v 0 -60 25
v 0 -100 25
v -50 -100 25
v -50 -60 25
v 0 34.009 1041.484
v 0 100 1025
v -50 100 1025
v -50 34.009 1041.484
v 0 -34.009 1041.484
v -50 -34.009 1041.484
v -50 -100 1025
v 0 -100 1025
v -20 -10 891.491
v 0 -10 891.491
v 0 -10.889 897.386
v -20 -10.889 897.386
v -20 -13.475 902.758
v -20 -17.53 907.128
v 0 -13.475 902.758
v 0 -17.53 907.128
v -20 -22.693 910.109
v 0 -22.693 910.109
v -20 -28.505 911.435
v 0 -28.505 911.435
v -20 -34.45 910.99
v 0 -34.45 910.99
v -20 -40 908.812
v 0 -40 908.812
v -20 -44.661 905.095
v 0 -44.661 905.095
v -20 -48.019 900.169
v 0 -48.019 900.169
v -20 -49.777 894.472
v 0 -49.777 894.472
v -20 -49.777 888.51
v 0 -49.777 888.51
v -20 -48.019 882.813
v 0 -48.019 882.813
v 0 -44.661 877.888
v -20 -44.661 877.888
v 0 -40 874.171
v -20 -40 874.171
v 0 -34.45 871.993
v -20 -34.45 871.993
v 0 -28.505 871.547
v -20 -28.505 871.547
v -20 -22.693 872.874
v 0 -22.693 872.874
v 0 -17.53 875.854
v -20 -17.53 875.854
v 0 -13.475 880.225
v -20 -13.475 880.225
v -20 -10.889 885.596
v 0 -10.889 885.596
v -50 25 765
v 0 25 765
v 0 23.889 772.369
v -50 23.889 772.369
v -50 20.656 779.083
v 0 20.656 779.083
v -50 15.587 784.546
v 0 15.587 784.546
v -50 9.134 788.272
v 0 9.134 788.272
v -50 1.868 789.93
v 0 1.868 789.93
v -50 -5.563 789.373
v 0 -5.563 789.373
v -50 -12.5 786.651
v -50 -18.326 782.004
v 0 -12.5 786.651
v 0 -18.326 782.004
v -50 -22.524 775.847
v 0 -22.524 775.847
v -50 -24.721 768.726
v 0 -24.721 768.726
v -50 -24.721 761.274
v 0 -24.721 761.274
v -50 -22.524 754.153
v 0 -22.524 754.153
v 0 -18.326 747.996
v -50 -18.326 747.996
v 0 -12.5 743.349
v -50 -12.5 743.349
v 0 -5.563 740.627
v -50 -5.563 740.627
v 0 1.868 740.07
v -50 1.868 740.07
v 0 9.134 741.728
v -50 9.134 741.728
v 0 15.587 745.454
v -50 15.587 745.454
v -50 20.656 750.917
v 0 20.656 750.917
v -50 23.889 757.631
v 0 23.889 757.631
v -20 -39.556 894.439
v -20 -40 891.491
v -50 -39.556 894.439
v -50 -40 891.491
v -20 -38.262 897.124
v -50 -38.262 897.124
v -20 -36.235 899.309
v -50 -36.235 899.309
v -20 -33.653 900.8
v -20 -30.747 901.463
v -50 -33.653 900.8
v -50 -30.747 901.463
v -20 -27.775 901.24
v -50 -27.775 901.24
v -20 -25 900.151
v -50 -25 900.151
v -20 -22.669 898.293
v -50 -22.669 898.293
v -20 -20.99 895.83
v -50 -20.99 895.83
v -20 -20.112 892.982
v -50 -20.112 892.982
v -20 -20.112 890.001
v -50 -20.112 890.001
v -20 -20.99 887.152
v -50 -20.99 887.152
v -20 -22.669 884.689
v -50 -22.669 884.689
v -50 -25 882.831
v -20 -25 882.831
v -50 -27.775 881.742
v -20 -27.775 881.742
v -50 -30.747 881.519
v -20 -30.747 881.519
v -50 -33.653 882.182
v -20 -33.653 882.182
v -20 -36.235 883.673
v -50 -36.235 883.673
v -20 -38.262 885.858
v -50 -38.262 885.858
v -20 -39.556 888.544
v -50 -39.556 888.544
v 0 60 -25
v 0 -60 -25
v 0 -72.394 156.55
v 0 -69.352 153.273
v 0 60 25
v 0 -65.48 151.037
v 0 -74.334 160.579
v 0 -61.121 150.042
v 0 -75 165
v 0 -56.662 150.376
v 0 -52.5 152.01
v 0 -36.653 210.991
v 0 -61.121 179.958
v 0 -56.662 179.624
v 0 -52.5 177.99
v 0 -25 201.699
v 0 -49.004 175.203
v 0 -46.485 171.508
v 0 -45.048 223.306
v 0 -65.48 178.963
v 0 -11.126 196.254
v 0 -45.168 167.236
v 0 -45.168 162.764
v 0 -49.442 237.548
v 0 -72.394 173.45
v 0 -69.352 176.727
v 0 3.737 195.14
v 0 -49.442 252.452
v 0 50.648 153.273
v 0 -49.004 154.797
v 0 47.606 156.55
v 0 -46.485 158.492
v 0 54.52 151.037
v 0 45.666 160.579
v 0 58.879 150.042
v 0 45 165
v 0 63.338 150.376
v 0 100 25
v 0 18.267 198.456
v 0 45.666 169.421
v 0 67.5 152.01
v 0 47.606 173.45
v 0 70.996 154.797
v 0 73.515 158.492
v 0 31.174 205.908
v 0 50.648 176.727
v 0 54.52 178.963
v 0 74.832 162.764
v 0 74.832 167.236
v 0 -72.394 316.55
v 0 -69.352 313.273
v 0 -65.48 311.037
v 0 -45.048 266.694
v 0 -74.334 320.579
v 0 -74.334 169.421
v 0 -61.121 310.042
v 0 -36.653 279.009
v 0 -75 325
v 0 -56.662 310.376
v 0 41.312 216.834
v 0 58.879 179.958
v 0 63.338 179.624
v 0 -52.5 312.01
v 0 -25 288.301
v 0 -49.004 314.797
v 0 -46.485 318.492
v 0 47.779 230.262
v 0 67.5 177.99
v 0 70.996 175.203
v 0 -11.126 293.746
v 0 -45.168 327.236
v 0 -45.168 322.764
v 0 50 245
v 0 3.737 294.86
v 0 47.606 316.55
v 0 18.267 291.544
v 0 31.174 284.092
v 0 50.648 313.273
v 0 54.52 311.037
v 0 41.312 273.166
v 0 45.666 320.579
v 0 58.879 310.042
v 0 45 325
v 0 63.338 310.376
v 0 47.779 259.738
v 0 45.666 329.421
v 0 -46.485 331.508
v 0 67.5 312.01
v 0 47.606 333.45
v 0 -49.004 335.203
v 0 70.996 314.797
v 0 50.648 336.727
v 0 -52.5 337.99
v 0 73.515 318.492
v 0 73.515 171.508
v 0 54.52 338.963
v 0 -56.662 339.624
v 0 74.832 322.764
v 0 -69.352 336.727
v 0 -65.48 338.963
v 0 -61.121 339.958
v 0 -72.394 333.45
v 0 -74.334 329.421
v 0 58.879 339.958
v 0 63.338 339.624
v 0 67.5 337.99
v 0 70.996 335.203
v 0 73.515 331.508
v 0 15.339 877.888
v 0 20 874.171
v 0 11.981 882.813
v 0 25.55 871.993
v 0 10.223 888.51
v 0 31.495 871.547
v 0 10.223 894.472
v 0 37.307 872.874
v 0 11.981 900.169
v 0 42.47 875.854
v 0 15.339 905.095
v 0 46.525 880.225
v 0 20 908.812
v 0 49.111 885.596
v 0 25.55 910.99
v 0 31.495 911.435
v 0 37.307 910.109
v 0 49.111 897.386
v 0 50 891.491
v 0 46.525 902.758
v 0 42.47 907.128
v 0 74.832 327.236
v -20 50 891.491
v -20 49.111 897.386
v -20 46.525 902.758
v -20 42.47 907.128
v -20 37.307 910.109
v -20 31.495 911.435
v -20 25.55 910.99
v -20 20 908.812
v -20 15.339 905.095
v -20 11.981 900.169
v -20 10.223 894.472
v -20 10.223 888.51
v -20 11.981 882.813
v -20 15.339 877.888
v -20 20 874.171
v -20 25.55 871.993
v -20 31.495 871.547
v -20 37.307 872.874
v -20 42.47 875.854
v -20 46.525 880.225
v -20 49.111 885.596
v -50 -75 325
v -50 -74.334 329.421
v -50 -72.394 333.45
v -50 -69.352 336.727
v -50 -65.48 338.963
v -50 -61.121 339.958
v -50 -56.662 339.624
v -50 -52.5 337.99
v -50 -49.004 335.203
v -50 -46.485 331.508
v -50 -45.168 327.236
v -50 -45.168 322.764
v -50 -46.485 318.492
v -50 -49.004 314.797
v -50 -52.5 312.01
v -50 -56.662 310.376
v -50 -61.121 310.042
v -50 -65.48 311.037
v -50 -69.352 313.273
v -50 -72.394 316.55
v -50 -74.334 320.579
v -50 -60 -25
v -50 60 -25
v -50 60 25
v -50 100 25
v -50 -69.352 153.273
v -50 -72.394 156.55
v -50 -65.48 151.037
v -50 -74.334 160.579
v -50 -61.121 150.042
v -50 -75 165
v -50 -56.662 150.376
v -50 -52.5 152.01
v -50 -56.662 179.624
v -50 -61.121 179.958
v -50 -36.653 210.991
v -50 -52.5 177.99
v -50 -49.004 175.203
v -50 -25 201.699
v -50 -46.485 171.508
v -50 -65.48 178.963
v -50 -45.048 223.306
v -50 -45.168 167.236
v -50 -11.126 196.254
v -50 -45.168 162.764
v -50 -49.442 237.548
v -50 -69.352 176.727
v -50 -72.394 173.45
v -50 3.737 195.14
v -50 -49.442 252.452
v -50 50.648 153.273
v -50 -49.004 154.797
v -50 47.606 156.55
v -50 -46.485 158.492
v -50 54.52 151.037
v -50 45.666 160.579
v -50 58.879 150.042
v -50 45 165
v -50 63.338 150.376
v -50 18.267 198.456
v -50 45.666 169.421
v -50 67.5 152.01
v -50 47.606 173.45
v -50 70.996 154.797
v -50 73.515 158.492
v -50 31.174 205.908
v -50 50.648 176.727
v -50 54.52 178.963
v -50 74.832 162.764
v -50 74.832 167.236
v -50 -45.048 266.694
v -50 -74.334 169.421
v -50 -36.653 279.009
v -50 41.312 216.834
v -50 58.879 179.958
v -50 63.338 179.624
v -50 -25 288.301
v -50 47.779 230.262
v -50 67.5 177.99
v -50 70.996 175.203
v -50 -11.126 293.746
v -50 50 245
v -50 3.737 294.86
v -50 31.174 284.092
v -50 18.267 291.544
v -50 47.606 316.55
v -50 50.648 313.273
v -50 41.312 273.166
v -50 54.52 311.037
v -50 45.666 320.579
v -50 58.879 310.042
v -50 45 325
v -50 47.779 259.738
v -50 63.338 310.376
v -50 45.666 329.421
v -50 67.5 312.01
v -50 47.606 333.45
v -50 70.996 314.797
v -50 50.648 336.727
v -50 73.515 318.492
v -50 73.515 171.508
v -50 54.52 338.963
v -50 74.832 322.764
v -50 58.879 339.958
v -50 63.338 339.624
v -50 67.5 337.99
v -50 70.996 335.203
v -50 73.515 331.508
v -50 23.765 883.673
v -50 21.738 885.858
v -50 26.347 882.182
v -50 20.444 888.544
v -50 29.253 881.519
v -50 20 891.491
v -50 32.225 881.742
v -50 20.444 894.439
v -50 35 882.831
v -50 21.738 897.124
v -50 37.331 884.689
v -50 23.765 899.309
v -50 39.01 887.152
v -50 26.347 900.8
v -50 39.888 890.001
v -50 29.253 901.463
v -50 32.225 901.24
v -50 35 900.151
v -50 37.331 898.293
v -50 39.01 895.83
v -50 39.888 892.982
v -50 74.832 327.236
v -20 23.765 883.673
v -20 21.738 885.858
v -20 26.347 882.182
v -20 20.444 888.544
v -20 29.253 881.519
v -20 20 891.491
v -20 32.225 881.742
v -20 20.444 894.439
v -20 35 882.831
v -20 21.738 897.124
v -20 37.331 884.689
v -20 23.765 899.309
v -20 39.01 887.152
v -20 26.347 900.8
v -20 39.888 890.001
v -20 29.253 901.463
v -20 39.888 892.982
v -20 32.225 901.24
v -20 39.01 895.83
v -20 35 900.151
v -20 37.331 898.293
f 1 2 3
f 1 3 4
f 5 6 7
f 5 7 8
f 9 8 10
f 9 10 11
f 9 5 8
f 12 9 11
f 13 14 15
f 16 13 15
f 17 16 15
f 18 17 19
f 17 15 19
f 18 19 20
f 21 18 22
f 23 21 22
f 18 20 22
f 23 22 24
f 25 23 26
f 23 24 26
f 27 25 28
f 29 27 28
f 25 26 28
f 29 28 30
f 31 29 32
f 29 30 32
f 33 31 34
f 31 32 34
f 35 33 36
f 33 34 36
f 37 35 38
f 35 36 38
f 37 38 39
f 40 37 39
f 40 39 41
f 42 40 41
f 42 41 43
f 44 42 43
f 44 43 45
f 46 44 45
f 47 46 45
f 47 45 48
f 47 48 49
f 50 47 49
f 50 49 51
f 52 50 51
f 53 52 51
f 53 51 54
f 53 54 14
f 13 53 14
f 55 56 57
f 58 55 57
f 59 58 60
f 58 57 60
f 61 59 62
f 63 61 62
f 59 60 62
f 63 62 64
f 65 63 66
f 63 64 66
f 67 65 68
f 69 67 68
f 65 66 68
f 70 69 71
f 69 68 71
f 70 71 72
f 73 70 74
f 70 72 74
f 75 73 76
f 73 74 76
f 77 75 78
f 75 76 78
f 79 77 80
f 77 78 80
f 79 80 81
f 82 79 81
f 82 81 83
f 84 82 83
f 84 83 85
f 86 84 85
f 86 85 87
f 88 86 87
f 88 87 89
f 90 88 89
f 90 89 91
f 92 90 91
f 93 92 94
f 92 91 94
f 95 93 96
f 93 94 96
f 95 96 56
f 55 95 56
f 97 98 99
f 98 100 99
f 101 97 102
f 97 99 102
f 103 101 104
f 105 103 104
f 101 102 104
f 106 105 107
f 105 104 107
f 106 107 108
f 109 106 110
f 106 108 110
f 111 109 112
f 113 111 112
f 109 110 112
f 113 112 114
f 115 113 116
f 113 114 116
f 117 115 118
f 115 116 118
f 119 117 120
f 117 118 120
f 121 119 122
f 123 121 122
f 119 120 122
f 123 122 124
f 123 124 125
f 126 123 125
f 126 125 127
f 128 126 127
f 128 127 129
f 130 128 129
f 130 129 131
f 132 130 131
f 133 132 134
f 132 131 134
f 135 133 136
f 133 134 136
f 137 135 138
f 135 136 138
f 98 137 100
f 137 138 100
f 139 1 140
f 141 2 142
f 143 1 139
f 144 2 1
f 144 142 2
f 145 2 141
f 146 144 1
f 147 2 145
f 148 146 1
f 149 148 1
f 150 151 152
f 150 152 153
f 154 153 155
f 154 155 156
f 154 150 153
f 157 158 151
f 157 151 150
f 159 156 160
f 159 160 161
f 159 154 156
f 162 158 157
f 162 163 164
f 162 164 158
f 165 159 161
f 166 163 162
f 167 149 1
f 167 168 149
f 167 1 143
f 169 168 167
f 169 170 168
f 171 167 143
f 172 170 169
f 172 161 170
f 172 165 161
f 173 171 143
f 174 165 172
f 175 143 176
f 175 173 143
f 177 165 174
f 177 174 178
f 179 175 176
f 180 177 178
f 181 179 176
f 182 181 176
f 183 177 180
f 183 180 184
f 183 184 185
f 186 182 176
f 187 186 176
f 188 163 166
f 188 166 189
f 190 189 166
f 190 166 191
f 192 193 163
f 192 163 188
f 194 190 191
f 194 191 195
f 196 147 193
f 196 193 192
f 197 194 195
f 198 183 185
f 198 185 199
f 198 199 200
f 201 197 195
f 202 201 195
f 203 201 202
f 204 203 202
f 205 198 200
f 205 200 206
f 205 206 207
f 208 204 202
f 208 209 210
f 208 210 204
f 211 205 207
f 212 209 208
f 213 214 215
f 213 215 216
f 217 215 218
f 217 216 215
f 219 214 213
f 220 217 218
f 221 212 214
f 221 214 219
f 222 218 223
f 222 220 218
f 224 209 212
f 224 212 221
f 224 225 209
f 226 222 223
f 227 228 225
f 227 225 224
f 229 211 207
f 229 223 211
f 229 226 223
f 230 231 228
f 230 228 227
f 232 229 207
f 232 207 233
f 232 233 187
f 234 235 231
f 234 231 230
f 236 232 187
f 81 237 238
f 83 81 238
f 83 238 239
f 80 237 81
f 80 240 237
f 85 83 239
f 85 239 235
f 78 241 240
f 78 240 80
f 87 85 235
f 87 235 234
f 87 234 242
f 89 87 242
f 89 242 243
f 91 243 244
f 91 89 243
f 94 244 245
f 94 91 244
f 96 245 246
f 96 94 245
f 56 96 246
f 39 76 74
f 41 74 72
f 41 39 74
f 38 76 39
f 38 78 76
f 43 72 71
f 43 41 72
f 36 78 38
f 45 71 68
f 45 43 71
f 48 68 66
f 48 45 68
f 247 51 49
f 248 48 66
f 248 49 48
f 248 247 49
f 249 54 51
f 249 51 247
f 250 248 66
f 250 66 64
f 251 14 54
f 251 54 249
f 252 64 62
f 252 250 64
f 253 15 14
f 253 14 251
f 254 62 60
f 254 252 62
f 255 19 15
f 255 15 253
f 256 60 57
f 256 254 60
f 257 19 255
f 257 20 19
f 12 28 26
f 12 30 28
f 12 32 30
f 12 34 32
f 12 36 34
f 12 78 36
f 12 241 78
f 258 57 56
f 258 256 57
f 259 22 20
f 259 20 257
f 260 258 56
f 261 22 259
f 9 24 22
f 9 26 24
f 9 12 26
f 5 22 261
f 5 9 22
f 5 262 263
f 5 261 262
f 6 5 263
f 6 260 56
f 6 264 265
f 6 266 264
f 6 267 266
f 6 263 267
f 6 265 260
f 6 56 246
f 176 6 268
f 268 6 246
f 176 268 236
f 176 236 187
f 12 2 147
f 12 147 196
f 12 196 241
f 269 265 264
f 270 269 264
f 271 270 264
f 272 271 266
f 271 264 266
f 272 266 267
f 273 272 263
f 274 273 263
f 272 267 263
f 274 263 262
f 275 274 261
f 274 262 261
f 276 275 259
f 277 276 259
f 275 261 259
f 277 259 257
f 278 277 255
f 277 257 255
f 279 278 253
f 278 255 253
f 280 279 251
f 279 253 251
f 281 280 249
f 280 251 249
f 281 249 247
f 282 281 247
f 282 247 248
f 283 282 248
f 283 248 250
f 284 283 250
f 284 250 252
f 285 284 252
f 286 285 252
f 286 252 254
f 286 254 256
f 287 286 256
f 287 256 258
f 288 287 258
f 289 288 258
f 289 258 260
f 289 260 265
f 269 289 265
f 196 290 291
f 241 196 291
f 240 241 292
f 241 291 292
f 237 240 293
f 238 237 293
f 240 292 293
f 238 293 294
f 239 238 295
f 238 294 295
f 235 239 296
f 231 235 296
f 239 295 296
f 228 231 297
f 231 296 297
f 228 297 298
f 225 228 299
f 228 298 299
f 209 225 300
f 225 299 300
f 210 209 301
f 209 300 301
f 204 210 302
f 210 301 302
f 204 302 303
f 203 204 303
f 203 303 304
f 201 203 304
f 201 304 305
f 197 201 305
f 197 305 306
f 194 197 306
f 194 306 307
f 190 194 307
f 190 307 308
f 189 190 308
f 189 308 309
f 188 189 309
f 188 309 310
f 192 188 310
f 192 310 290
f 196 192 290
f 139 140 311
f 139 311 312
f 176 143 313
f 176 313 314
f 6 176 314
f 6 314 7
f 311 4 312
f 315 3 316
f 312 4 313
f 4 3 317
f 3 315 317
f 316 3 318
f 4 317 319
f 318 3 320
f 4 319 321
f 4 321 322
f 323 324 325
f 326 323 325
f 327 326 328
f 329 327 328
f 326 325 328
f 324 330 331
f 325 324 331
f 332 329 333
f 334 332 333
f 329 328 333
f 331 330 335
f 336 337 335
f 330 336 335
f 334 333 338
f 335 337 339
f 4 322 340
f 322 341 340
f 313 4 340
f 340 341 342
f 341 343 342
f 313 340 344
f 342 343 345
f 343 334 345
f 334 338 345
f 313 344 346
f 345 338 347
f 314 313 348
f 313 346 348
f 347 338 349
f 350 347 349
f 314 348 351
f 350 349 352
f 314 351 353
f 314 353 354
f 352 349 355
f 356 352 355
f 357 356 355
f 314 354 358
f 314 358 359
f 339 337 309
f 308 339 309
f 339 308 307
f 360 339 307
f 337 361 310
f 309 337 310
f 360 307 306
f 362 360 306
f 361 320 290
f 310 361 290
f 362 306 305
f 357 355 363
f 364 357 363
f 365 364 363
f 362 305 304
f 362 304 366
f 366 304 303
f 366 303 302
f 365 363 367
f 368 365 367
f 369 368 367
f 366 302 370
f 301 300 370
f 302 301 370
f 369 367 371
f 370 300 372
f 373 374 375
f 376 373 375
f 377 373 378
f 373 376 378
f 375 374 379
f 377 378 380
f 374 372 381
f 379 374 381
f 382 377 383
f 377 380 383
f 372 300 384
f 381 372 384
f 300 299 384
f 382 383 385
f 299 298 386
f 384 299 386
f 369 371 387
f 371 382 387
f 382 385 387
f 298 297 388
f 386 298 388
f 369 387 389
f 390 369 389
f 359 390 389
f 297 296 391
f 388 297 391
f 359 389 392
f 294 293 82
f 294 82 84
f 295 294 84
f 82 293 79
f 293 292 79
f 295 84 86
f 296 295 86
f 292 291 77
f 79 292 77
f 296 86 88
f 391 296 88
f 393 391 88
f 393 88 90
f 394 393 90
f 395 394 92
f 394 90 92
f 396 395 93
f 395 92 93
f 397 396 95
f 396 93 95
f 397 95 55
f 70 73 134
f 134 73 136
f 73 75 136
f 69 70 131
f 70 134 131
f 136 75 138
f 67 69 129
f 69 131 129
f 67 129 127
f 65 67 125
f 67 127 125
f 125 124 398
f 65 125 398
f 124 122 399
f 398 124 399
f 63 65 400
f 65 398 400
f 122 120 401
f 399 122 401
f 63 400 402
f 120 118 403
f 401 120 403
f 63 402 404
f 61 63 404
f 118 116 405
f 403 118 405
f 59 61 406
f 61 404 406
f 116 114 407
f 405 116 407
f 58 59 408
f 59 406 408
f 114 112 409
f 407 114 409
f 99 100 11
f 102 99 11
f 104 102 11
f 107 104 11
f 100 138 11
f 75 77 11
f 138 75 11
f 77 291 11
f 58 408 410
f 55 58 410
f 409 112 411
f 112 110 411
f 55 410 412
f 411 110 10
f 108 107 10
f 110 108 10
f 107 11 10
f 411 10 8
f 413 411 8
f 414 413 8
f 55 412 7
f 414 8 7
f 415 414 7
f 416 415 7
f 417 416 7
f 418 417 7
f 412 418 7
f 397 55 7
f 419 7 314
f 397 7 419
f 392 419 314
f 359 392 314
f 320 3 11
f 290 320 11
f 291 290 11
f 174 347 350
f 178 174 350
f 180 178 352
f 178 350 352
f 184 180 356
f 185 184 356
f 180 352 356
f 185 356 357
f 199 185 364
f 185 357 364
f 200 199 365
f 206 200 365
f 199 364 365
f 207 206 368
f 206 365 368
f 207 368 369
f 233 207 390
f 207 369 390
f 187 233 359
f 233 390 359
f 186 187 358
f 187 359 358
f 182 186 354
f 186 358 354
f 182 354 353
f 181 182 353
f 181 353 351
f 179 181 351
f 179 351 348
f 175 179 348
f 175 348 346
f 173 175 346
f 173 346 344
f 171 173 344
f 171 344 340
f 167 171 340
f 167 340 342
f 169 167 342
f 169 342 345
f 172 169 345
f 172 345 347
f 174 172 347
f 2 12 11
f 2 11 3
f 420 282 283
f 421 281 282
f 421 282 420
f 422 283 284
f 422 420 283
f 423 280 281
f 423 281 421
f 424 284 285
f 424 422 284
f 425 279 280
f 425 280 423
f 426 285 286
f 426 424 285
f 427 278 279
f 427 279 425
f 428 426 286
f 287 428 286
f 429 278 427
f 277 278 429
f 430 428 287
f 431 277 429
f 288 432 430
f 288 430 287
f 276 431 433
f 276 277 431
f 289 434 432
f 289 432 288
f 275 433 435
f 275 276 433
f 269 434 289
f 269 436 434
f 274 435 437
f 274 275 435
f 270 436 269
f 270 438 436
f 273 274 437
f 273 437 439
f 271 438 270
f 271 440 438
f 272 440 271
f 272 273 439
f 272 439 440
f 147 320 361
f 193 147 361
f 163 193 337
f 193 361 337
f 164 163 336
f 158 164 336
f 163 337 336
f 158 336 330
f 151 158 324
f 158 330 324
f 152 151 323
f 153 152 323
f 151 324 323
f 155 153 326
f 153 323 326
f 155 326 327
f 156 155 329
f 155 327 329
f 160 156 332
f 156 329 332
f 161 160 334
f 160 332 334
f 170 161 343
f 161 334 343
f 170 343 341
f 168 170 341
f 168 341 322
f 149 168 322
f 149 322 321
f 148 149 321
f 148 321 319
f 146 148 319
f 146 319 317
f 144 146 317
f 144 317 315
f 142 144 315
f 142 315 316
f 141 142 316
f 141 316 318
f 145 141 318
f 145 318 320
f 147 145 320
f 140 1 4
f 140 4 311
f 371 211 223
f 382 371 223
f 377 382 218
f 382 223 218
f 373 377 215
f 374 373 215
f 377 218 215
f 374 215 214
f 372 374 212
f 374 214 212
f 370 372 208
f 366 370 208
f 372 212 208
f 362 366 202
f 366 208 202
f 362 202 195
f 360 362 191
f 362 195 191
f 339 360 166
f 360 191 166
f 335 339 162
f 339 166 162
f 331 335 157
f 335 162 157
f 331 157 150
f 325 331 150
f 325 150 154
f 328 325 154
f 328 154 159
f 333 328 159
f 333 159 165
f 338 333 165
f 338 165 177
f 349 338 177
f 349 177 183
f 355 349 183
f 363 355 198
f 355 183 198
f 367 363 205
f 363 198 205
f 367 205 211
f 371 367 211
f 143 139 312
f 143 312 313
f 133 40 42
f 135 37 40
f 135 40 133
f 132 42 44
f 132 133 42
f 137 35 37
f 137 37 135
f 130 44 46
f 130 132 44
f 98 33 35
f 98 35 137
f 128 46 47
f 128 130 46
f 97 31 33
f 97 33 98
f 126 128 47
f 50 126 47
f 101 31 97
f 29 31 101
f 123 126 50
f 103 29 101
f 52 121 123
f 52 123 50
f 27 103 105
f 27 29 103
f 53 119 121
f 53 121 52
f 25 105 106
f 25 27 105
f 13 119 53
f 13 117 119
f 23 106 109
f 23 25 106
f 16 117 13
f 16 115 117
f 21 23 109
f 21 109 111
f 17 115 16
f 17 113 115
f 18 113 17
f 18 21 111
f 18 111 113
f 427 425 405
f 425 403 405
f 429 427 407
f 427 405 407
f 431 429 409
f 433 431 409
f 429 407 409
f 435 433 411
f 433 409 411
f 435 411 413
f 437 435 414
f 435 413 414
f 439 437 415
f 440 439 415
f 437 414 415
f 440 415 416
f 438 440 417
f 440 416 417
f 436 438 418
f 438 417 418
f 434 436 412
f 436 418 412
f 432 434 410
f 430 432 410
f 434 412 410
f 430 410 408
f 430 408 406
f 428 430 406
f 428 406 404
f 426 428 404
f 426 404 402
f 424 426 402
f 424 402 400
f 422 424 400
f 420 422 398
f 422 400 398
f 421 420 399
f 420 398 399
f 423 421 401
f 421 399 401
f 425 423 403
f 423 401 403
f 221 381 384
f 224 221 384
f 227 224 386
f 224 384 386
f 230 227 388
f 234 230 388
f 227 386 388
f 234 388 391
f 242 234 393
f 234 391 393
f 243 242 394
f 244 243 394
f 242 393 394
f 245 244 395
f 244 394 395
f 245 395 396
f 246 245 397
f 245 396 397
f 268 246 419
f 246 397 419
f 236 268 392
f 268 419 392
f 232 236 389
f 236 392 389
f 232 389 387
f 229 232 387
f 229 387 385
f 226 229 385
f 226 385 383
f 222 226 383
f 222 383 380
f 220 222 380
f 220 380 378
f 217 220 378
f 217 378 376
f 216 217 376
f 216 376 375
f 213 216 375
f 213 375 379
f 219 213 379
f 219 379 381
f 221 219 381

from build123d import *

# Parameters (mm, degrees)
F0_R           = 50
F0_R_2         = 25
F1_DEPTH       = 50
F2_D           = 30
F3_D           = 20
F3_CBORE_D     = 40
F3_CBORE_DEPTH = 20


with BuildPart() as f1:
    # F0 (on Right) → F1 (new body)
    with BuildSketch(Plane.YZ):
        with BuildLine():
            Line((-60, -25), (60, -25))
            Line((60, -25), (60, 25))
            Line((60, 25), (100, 25))
            Line((100, 25), (100, 1025))
            ThreePointArc((100, 1025), (0, 1043.567766), (-100, 1025))
            Line((-100, 1025), (-100, 25))
            Line((-100, 25), (-60, 25))
            Line((-60, 25), (-60, -25))
        make_face()
        with Locations((0, 245)):
            Circle(F0_R, mode=Mode.SUBTRACT)
        with Locations((0, 765)):
            Circle(F0_R_2, mode=Mode.SUBTRACT)
    extrude(amount=-F1_DEPTH)

    # F2 (through all)
    with Locations(Plane.YZ):
        with Locations((-60, 165), (-60, 325), (60, 325), (60, 165)):
            Hole(F2_D / 2)

    # F3 (through all)
    with Locations(Plane.YZ):
        with Locations((30, 891.491106), (-30, 891.491106)):
            CounterBoreHole(F3_D / 2, F3_CBORE_D / 2, F3_CBORE_DEPTH)


solid = f1.part
